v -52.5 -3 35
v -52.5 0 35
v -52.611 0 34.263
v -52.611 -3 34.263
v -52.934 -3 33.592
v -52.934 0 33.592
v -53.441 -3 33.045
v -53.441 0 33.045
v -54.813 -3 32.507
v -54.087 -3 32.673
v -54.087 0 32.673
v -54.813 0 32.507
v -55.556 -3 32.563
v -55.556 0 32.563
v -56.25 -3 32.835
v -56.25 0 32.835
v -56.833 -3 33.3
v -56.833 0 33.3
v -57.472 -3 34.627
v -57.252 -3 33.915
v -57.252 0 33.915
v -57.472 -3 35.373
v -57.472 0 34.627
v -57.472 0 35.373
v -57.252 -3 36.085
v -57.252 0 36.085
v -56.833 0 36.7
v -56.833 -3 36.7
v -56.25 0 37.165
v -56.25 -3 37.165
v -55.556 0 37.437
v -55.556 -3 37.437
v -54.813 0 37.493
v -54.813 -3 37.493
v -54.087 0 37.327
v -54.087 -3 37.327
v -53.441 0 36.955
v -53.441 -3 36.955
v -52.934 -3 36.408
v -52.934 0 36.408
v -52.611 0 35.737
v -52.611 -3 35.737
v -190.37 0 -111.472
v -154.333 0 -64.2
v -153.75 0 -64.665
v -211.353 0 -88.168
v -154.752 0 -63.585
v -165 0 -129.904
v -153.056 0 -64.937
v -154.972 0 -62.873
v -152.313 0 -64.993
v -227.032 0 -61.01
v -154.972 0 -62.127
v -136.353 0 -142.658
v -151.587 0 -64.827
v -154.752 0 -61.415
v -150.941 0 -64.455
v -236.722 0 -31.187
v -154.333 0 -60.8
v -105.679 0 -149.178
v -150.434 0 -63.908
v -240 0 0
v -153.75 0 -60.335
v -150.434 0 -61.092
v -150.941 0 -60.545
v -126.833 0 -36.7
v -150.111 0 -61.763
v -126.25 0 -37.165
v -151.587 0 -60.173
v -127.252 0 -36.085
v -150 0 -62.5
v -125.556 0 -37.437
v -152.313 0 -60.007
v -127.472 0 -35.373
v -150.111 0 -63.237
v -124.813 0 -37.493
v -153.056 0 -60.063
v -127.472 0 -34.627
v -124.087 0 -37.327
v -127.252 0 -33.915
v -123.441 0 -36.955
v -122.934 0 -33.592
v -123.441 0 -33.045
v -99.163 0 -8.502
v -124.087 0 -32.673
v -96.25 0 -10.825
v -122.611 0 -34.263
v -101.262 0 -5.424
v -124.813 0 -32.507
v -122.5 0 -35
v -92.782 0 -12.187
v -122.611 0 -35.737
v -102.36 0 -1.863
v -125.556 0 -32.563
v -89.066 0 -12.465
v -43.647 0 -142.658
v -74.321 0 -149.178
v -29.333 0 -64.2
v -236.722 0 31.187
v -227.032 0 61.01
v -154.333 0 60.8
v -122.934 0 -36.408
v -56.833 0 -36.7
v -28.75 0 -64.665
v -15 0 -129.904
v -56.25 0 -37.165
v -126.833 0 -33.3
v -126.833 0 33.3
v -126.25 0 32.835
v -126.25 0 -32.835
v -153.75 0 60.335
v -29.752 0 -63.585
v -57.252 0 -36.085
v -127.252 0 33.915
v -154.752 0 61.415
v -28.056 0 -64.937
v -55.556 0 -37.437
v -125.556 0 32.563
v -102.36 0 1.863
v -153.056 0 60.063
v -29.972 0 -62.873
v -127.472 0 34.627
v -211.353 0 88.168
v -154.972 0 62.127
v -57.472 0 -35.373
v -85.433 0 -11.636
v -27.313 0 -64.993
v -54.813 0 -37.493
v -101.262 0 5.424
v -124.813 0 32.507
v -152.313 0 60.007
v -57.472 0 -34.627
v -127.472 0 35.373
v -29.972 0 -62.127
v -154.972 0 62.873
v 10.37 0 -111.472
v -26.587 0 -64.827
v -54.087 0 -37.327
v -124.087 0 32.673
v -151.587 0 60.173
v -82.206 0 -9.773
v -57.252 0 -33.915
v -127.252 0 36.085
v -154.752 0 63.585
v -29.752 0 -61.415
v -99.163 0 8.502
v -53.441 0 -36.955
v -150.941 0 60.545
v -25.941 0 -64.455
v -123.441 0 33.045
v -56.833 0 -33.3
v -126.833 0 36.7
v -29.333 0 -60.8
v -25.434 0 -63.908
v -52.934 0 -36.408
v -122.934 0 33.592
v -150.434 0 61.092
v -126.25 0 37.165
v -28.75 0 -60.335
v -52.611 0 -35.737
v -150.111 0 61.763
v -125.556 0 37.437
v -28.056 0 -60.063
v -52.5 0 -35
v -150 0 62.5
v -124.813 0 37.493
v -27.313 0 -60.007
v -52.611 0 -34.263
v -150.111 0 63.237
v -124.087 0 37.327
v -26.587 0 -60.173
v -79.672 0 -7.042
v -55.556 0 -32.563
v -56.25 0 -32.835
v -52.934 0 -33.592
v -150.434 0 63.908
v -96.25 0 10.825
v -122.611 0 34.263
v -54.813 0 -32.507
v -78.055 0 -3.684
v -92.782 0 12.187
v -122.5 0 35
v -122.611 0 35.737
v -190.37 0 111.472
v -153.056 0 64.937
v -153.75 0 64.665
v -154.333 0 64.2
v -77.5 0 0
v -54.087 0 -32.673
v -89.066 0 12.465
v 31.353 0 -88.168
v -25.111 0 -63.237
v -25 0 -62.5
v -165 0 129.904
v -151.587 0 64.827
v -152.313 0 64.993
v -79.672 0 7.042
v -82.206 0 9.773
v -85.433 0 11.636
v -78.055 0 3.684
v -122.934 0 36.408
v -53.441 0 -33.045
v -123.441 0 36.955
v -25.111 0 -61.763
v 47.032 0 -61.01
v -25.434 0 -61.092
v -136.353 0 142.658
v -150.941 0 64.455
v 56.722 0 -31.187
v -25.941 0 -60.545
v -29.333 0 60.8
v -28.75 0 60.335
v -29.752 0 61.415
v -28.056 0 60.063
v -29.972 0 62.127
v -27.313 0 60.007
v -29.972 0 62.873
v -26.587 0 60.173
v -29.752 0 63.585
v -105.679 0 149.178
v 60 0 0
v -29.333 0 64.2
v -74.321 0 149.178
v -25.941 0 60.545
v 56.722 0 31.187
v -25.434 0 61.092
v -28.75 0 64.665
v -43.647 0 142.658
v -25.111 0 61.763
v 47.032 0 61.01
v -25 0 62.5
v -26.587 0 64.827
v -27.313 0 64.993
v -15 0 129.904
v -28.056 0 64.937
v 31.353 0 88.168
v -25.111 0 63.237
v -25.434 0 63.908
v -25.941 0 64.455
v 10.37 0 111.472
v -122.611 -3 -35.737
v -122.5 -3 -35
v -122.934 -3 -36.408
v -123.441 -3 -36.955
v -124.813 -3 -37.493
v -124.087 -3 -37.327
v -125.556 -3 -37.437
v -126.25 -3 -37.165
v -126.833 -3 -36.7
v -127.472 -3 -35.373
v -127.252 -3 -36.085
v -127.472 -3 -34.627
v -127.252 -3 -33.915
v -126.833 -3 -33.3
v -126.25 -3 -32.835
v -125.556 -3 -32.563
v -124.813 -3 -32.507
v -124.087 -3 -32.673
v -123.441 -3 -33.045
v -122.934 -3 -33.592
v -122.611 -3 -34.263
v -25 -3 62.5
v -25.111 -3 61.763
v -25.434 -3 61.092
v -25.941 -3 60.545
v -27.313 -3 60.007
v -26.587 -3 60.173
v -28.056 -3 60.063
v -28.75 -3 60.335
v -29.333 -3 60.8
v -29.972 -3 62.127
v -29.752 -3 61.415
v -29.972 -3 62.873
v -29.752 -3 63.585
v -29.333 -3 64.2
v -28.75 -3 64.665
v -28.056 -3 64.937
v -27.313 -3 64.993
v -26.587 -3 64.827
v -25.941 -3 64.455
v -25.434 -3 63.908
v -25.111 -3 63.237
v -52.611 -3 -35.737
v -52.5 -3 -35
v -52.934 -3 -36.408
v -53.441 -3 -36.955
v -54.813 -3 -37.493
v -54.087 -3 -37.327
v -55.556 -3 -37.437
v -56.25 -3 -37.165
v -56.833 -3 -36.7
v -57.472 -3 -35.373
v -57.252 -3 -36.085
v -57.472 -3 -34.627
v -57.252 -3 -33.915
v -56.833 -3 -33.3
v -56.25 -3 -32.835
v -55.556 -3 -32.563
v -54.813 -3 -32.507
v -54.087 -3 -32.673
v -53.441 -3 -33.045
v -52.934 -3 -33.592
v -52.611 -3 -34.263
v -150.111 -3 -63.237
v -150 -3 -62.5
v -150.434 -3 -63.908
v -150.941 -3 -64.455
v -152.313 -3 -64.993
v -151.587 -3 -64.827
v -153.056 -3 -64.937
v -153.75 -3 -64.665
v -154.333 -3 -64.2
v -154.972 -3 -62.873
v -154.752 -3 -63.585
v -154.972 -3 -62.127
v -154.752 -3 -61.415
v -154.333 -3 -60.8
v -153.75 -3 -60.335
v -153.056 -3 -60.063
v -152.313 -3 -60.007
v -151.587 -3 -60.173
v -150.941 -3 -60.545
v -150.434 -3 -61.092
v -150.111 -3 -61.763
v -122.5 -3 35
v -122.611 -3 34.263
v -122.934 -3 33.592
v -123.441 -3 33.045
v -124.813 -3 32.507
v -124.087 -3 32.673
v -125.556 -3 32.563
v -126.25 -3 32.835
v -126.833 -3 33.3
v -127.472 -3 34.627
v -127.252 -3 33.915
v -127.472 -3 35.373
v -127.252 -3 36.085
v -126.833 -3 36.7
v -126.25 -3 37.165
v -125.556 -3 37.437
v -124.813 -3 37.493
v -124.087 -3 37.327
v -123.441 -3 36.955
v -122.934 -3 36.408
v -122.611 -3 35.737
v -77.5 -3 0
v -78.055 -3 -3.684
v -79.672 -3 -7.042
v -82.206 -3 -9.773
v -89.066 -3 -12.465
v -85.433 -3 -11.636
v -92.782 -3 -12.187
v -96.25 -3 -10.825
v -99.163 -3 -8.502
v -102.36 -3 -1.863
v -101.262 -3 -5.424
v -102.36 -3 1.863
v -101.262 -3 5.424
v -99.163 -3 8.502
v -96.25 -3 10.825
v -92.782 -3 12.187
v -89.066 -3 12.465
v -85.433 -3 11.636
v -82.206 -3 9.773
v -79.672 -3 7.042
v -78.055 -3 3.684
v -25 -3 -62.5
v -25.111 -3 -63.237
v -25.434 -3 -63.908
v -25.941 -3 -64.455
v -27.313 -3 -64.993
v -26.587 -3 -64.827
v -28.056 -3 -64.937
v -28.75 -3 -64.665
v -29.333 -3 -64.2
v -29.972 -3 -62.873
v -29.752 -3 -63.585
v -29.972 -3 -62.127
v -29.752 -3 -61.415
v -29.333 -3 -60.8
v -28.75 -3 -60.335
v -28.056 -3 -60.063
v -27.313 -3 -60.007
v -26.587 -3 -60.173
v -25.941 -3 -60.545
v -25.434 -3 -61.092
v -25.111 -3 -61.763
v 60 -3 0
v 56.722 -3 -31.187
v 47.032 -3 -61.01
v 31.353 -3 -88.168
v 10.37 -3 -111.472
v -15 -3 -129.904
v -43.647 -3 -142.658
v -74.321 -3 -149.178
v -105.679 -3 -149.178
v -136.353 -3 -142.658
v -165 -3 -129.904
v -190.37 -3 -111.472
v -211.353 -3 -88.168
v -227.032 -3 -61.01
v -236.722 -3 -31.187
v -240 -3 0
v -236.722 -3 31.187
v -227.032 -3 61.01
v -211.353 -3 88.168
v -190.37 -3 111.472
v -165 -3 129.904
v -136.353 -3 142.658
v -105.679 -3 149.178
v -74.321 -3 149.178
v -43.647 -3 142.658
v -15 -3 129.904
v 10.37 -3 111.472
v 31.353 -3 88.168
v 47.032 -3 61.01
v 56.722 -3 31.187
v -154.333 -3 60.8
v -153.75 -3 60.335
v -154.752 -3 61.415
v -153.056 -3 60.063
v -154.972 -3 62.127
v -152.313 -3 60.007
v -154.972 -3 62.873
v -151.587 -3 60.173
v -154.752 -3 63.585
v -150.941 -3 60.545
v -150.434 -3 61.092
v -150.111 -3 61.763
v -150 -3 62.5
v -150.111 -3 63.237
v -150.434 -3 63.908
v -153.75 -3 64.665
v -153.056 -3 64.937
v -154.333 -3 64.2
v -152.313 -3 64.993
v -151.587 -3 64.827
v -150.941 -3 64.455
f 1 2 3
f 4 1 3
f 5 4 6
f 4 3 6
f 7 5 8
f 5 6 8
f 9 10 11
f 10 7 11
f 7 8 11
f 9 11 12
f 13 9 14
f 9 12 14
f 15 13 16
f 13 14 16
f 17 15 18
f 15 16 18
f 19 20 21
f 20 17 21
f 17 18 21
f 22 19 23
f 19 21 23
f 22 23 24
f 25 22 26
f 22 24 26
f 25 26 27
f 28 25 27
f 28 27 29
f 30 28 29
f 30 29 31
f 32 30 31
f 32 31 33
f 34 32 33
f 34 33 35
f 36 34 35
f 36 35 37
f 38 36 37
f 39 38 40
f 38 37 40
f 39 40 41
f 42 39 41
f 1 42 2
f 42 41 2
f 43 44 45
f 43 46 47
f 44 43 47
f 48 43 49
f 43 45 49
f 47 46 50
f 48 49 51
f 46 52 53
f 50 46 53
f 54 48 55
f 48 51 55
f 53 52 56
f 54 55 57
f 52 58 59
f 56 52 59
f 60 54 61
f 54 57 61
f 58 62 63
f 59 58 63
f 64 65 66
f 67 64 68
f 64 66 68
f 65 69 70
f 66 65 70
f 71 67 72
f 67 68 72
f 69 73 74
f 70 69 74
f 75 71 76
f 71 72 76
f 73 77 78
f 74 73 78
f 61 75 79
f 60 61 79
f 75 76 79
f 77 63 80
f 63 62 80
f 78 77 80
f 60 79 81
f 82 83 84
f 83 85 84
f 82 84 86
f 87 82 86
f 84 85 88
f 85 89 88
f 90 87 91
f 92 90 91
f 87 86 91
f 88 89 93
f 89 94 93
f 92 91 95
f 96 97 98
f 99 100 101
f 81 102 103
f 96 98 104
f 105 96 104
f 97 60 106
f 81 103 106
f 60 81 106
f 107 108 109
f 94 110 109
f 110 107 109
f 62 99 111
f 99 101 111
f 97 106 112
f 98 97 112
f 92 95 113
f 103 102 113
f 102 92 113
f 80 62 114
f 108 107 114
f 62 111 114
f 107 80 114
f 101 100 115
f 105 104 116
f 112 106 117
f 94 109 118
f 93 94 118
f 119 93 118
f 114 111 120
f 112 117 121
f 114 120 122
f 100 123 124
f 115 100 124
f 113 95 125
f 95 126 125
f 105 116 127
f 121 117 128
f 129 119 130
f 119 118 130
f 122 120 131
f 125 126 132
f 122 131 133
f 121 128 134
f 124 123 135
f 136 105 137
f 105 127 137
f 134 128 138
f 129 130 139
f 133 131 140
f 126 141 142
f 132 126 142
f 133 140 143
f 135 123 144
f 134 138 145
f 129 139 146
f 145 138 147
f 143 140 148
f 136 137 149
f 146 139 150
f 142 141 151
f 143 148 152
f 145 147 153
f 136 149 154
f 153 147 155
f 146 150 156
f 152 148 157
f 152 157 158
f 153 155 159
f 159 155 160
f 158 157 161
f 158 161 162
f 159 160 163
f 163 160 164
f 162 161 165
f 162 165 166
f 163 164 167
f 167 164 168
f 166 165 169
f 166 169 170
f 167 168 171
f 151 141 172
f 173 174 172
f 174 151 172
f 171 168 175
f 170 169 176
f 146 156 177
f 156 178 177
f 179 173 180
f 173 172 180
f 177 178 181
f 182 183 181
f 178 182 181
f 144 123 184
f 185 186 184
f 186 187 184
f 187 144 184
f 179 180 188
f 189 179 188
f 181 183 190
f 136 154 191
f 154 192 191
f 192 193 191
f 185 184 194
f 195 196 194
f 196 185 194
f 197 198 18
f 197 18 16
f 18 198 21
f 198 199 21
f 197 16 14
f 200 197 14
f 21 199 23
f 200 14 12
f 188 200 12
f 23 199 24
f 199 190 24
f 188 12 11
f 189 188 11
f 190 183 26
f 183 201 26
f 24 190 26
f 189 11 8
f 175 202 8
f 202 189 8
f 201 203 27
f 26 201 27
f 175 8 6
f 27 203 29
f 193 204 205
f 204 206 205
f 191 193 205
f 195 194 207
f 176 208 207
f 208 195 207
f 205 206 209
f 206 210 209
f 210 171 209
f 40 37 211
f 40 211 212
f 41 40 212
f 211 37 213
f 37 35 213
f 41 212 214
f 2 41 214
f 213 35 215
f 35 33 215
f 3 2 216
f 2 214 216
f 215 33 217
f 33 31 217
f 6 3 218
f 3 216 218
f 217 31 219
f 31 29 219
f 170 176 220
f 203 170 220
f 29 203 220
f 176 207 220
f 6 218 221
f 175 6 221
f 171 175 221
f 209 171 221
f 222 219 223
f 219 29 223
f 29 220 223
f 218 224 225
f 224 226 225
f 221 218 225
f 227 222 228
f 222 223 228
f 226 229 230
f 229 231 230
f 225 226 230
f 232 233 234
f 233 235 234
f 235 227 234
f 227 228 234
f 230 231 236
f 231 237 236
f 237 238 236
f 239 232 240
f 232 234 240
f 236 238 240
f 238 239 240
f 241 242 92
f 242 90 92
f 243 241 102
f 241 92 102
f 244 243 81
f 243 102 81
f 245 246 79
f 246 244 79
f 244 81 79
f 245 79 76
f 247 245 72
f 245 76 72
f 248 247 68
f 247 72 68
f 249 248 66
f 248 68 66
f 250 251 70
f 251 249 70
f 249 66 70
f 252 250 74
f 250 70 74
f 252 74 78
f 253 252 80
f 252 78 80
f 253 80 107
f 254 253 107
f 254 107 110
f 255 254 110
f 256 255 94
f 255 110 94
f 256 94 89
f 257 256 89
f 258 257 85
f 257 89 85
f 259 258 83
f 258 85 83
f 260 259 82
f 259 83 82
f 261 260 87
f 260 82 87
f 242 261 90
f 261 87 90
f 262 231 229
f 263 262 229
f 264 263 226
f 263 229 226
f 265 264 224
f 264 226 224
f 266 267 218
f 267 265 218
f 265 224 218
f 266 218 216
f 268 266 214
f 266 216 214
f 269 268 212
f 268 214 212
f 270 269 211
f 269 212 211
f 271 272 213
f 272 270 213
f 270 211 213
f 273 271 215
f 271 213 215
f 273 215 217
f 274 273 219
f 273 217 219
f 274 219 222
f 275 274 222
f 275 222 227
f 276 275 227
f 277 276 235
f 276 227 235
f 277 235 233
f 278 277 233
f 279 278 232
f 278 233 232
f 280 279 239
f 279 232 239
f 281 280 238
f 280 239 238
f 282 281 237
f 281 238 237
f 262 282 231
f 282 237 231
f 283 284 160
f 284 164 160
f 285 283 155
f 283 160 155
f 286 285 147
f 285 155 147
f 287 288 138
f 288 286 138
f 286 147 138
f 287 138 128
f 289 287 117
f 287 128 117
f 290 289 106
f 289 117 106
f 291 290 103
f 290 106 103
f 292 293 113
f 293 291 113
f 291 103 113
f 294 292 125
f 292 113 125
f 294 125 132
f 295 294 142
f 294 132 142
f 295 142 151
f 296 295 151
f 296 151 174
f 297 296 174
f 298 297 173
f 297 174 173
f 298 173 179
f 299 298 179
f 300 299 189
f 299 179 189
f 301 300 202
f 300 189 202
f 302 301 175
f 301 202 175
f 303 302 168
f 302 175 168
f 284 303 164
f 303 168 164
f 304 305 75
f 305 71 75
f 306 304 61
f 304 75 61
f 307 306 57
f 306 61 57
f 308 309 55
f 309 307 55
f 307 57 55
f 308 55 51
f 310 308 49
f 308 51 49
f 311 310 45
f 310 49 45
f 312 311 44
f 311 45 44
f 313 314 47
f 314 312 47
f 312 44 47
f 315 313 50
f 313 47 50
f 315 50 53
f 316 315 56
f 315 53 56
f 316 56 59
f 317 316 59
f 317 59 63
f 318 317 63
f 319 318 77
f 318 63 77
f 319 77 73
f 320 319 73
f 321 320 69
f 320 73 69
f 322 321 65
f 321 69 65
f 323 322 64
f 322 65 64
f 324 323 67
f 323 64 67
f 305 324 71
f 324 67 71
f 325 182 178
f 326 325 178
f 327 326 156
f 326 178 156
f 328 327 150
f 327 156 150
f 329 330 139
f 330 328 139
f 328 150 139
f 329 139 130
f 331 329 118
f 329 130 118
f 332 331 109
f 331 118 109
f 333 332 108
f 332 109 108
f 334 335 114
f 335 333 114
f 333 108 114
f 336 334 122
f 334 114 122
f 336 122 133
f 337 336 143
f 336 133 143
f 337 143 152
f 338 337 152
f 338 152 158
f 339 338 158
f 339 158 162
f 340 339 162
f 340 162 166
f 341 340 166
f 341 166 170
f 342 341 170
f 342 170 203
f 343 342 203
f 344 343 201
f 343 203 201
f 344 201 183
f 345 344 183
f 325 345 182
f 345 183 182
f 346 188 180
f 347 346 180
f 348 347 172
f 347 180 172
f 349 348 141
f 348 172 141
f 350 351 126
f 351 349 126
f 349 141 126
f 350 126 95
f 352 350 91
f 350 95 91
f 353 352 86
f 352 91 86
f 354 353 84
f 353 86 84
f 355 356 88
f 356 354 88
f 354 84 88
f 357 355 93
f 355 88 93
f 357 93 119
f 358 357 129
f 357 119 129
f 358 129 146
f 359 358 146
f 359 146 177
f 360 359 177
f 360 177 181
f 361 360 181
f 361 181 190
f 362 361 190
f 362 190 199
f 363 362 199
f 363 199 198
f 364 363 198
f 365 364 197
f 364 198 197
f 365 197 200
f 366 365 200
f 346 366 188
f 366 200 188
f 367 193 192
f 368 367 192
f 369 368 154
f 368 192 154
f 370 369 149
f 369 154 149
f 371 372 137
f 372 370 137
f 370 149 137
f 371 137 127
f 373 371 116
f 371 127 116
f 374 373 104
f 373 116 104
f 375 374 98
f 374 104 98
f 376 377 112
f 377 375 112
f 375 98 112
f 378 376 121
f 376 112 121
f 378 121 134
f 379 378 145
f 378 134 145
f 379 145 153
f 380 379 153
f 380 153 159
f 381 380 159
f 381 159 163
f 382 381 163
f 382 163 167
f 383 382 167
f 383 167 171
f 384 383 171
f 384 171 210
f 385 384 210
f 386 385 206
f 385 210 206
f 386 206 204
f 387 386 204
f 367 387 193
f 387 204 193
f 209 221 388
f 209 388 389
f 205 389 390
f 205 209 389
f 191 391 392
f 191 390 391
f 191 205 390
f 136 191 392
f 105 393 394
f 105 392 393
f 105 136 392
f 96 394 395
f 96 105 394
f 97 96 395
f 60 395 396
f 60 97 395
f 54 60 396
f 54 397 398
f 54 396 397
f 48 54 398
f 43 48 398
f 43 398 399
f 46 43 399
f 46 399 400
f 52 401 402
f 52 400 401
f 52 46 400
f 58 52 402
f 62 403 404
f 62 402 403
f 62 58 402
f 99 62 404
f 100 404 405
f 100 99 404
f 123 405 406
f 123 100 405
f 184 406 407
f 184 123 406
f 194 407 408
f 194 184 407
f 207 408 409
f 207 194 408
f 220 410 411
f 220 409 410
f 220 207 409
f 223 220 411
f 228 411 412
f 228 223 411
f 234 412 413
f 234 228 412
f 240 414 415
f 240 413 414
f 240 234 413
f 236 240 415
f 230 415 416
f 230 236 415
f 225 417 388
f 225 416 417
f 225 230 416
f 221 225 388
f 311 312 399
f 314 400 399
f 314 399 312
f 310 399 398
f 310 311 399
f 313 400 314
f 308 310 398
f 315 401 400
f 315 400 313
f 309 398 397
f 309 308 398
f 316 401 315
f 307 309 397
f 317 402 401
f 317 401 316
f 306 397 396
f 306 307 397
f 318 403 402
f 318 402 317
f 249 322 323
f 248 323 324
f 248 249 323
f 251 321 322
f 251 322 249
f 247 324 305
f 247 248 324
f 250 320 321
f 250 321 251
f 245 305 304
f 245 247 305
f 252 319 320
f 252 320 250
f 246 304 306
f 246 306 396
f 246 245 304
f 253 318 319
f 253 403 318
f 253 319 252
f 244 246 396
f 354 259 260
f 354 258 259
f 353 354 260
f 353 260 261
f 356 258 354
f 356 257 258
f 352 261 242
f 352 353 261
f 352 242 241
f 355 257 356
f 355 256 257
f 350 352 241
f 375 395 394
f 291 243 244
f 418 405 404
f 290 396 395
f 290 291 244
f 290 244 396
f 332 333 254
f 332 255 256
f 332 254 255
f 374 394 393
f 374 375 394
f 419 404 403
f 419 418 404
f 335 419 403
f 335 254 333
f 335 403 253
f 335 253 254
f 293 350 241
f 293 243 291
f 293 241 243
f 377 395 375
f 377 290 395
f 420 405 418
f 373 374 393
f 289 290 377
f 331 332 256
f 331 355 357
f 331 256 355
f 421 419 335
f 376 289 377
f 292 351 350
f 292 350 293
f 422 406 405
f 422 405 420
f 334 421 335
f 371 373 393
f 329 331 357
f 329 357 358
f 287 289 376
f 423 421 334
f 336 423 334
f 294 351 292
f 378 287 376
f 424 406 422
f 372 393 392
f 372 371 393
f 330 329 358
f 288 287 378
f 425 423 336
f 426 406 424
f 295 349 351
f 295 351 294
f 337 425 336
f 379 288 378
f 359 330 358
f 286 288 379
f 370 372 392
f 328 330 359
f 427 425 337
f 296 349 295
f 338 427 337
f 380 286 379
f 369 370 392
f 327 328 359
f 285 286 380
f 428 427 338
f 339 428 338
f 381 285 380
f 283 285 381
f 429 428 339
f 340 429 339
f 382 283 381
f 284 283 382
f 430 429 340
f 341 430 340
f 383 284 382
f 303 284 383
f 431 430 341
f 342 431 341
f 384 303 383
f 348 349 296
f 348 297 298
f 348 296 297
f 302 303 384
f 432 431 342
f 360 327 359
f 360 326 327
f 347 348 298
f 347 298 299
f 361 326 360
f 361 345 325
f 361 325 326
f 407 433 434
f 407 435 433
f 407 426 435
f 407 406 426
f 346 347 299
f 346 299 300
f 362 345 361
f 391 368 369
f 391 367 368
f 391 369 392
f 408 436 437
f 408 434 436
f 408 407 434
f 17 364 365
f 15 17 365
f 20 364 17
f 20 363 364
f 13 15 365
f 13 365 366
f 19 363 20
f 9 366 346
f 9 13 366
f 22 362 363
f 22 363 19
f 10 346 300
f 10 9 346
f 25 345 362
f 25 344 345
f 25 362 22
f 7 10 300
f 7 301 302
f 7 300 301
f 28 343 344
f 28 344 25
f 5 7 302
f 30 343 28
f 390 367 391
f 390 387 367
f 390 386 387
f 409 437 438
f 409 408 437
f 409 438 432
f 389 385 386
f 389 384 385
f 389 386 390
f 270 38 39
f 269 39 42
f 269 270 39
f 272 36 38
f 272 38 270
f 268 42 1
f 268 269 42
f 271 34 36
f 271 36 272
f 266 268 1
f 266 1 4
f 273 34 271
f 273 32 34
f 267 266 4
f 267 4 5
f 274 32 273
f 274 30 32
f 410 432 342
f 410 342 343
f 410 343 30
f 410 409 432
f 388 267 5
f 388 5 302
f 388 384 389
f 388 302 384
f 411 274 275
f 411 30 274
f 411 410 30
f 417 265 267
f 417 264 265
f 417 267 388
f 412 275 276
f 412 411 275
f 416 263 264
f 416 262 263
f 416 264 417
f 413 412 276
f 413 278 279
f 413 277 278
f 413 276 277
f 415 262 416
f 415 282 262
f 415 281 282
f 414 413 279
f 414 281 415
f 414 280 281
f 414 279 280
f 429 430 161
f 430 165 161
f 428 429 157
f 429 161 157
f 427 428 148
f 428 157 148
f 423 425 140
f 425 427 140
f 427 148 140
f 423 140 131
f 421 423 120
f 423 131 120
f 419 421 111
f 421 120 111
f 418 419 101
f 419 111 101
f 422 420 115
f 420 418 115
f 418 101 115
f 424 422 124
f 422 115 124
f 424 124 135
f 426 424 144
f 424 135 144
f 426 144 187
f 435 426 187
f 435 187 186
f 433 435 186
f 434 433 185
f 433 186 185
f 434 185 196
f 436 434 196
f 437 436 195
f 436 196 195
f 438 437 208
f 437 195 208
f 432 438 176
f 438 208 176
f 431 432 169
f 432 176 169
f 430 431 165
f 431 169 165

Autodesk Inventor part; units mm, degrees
ref_plane "YZ Plane" through (0, 0, 0) normal (1, 0, 0) x (0, 1, 0)
ref_plane "XZ Plane" through (0, 0, 0) normal (0, 1, 0) x (-1, 0, 0)
ref_plane "XY Plane" through (0, 0, 0) normal (0, 0, 1) x (1, 0, 0)
sketch "Sketch5" plane through (0, 0, -50) normal (0, -1, 0) x (1, 0, 0)
  line L0 (-90, 50) -> (35, 50) construction
  line L1 (60, 50) -> (-240, 50) construction
  line L2 (-180, 50) -> (0, 50) construction
  line L3 (0, 110) -> (0, -10) construction
  line L4 (-125, 85) -> (-55, 85) construction
  line L5 (-55, 85) -> (-55, 15) construction
  line L6 (-55, 15) -> (-125, 15) construction
  line L7 (-125, 15) -> (-125, 85) construction
  line L8 (-125, 85) -> (-55, 15) construction
  line L9 (-55, 85) -> (-125, 15) construction
  circle A0 centre (-90, 50) radius 150
  circle A1 centre (-125, 15) radius 2.5
  circle A2 centre (-55, 15) radius 2.5
  circle A3 centre (-55, 85) radius 2.5
  circle A4 centre (-125, 85) radius 2.5
  circle A5 centre (-90, 50) radius 12.5
  line L10 (-152.5, -12.5) -> (-27.5, -12.5) construction
  line L11 (-27.5, -12.5) -> (-27.5, 112.5) construction
  line L12 (-27.5, 112.5) -> (-152.5, 112.5) construction
  line L13 (-152.5, 112.5) -> (-152.5, -12.5) construction
  line L14 (-152.5, -12.5) -> (-27.5, 112.5) construction
  line L15 (-27.5, -12.5) -> (-152.5, 112.5) construction
  circle A6 centre (-152.5, -12.5) radius 2.5
  circle A7 centre (-27.5, -12.5) radius 2.5
  circle A8 centre (-27.5, 112.5) radius 2.5
  circle A9 centre (-152.5, 112.5) radius 2.5
  dimension "d57" = 300
  dimension "d25" = 125
  dimension "d50" = 70
  dimension "d51" = 70
  dimension "d52" = 5
  dimension "d53" = 25
  dimension "d54" = 125
  dimension "d55" = 125
  dimension "d56" = 5
extrude "Extrusion5" add sketch "Sketch5" along normal blind 3
properties part number "Foundation-Fork" material "Steel, Mild"
